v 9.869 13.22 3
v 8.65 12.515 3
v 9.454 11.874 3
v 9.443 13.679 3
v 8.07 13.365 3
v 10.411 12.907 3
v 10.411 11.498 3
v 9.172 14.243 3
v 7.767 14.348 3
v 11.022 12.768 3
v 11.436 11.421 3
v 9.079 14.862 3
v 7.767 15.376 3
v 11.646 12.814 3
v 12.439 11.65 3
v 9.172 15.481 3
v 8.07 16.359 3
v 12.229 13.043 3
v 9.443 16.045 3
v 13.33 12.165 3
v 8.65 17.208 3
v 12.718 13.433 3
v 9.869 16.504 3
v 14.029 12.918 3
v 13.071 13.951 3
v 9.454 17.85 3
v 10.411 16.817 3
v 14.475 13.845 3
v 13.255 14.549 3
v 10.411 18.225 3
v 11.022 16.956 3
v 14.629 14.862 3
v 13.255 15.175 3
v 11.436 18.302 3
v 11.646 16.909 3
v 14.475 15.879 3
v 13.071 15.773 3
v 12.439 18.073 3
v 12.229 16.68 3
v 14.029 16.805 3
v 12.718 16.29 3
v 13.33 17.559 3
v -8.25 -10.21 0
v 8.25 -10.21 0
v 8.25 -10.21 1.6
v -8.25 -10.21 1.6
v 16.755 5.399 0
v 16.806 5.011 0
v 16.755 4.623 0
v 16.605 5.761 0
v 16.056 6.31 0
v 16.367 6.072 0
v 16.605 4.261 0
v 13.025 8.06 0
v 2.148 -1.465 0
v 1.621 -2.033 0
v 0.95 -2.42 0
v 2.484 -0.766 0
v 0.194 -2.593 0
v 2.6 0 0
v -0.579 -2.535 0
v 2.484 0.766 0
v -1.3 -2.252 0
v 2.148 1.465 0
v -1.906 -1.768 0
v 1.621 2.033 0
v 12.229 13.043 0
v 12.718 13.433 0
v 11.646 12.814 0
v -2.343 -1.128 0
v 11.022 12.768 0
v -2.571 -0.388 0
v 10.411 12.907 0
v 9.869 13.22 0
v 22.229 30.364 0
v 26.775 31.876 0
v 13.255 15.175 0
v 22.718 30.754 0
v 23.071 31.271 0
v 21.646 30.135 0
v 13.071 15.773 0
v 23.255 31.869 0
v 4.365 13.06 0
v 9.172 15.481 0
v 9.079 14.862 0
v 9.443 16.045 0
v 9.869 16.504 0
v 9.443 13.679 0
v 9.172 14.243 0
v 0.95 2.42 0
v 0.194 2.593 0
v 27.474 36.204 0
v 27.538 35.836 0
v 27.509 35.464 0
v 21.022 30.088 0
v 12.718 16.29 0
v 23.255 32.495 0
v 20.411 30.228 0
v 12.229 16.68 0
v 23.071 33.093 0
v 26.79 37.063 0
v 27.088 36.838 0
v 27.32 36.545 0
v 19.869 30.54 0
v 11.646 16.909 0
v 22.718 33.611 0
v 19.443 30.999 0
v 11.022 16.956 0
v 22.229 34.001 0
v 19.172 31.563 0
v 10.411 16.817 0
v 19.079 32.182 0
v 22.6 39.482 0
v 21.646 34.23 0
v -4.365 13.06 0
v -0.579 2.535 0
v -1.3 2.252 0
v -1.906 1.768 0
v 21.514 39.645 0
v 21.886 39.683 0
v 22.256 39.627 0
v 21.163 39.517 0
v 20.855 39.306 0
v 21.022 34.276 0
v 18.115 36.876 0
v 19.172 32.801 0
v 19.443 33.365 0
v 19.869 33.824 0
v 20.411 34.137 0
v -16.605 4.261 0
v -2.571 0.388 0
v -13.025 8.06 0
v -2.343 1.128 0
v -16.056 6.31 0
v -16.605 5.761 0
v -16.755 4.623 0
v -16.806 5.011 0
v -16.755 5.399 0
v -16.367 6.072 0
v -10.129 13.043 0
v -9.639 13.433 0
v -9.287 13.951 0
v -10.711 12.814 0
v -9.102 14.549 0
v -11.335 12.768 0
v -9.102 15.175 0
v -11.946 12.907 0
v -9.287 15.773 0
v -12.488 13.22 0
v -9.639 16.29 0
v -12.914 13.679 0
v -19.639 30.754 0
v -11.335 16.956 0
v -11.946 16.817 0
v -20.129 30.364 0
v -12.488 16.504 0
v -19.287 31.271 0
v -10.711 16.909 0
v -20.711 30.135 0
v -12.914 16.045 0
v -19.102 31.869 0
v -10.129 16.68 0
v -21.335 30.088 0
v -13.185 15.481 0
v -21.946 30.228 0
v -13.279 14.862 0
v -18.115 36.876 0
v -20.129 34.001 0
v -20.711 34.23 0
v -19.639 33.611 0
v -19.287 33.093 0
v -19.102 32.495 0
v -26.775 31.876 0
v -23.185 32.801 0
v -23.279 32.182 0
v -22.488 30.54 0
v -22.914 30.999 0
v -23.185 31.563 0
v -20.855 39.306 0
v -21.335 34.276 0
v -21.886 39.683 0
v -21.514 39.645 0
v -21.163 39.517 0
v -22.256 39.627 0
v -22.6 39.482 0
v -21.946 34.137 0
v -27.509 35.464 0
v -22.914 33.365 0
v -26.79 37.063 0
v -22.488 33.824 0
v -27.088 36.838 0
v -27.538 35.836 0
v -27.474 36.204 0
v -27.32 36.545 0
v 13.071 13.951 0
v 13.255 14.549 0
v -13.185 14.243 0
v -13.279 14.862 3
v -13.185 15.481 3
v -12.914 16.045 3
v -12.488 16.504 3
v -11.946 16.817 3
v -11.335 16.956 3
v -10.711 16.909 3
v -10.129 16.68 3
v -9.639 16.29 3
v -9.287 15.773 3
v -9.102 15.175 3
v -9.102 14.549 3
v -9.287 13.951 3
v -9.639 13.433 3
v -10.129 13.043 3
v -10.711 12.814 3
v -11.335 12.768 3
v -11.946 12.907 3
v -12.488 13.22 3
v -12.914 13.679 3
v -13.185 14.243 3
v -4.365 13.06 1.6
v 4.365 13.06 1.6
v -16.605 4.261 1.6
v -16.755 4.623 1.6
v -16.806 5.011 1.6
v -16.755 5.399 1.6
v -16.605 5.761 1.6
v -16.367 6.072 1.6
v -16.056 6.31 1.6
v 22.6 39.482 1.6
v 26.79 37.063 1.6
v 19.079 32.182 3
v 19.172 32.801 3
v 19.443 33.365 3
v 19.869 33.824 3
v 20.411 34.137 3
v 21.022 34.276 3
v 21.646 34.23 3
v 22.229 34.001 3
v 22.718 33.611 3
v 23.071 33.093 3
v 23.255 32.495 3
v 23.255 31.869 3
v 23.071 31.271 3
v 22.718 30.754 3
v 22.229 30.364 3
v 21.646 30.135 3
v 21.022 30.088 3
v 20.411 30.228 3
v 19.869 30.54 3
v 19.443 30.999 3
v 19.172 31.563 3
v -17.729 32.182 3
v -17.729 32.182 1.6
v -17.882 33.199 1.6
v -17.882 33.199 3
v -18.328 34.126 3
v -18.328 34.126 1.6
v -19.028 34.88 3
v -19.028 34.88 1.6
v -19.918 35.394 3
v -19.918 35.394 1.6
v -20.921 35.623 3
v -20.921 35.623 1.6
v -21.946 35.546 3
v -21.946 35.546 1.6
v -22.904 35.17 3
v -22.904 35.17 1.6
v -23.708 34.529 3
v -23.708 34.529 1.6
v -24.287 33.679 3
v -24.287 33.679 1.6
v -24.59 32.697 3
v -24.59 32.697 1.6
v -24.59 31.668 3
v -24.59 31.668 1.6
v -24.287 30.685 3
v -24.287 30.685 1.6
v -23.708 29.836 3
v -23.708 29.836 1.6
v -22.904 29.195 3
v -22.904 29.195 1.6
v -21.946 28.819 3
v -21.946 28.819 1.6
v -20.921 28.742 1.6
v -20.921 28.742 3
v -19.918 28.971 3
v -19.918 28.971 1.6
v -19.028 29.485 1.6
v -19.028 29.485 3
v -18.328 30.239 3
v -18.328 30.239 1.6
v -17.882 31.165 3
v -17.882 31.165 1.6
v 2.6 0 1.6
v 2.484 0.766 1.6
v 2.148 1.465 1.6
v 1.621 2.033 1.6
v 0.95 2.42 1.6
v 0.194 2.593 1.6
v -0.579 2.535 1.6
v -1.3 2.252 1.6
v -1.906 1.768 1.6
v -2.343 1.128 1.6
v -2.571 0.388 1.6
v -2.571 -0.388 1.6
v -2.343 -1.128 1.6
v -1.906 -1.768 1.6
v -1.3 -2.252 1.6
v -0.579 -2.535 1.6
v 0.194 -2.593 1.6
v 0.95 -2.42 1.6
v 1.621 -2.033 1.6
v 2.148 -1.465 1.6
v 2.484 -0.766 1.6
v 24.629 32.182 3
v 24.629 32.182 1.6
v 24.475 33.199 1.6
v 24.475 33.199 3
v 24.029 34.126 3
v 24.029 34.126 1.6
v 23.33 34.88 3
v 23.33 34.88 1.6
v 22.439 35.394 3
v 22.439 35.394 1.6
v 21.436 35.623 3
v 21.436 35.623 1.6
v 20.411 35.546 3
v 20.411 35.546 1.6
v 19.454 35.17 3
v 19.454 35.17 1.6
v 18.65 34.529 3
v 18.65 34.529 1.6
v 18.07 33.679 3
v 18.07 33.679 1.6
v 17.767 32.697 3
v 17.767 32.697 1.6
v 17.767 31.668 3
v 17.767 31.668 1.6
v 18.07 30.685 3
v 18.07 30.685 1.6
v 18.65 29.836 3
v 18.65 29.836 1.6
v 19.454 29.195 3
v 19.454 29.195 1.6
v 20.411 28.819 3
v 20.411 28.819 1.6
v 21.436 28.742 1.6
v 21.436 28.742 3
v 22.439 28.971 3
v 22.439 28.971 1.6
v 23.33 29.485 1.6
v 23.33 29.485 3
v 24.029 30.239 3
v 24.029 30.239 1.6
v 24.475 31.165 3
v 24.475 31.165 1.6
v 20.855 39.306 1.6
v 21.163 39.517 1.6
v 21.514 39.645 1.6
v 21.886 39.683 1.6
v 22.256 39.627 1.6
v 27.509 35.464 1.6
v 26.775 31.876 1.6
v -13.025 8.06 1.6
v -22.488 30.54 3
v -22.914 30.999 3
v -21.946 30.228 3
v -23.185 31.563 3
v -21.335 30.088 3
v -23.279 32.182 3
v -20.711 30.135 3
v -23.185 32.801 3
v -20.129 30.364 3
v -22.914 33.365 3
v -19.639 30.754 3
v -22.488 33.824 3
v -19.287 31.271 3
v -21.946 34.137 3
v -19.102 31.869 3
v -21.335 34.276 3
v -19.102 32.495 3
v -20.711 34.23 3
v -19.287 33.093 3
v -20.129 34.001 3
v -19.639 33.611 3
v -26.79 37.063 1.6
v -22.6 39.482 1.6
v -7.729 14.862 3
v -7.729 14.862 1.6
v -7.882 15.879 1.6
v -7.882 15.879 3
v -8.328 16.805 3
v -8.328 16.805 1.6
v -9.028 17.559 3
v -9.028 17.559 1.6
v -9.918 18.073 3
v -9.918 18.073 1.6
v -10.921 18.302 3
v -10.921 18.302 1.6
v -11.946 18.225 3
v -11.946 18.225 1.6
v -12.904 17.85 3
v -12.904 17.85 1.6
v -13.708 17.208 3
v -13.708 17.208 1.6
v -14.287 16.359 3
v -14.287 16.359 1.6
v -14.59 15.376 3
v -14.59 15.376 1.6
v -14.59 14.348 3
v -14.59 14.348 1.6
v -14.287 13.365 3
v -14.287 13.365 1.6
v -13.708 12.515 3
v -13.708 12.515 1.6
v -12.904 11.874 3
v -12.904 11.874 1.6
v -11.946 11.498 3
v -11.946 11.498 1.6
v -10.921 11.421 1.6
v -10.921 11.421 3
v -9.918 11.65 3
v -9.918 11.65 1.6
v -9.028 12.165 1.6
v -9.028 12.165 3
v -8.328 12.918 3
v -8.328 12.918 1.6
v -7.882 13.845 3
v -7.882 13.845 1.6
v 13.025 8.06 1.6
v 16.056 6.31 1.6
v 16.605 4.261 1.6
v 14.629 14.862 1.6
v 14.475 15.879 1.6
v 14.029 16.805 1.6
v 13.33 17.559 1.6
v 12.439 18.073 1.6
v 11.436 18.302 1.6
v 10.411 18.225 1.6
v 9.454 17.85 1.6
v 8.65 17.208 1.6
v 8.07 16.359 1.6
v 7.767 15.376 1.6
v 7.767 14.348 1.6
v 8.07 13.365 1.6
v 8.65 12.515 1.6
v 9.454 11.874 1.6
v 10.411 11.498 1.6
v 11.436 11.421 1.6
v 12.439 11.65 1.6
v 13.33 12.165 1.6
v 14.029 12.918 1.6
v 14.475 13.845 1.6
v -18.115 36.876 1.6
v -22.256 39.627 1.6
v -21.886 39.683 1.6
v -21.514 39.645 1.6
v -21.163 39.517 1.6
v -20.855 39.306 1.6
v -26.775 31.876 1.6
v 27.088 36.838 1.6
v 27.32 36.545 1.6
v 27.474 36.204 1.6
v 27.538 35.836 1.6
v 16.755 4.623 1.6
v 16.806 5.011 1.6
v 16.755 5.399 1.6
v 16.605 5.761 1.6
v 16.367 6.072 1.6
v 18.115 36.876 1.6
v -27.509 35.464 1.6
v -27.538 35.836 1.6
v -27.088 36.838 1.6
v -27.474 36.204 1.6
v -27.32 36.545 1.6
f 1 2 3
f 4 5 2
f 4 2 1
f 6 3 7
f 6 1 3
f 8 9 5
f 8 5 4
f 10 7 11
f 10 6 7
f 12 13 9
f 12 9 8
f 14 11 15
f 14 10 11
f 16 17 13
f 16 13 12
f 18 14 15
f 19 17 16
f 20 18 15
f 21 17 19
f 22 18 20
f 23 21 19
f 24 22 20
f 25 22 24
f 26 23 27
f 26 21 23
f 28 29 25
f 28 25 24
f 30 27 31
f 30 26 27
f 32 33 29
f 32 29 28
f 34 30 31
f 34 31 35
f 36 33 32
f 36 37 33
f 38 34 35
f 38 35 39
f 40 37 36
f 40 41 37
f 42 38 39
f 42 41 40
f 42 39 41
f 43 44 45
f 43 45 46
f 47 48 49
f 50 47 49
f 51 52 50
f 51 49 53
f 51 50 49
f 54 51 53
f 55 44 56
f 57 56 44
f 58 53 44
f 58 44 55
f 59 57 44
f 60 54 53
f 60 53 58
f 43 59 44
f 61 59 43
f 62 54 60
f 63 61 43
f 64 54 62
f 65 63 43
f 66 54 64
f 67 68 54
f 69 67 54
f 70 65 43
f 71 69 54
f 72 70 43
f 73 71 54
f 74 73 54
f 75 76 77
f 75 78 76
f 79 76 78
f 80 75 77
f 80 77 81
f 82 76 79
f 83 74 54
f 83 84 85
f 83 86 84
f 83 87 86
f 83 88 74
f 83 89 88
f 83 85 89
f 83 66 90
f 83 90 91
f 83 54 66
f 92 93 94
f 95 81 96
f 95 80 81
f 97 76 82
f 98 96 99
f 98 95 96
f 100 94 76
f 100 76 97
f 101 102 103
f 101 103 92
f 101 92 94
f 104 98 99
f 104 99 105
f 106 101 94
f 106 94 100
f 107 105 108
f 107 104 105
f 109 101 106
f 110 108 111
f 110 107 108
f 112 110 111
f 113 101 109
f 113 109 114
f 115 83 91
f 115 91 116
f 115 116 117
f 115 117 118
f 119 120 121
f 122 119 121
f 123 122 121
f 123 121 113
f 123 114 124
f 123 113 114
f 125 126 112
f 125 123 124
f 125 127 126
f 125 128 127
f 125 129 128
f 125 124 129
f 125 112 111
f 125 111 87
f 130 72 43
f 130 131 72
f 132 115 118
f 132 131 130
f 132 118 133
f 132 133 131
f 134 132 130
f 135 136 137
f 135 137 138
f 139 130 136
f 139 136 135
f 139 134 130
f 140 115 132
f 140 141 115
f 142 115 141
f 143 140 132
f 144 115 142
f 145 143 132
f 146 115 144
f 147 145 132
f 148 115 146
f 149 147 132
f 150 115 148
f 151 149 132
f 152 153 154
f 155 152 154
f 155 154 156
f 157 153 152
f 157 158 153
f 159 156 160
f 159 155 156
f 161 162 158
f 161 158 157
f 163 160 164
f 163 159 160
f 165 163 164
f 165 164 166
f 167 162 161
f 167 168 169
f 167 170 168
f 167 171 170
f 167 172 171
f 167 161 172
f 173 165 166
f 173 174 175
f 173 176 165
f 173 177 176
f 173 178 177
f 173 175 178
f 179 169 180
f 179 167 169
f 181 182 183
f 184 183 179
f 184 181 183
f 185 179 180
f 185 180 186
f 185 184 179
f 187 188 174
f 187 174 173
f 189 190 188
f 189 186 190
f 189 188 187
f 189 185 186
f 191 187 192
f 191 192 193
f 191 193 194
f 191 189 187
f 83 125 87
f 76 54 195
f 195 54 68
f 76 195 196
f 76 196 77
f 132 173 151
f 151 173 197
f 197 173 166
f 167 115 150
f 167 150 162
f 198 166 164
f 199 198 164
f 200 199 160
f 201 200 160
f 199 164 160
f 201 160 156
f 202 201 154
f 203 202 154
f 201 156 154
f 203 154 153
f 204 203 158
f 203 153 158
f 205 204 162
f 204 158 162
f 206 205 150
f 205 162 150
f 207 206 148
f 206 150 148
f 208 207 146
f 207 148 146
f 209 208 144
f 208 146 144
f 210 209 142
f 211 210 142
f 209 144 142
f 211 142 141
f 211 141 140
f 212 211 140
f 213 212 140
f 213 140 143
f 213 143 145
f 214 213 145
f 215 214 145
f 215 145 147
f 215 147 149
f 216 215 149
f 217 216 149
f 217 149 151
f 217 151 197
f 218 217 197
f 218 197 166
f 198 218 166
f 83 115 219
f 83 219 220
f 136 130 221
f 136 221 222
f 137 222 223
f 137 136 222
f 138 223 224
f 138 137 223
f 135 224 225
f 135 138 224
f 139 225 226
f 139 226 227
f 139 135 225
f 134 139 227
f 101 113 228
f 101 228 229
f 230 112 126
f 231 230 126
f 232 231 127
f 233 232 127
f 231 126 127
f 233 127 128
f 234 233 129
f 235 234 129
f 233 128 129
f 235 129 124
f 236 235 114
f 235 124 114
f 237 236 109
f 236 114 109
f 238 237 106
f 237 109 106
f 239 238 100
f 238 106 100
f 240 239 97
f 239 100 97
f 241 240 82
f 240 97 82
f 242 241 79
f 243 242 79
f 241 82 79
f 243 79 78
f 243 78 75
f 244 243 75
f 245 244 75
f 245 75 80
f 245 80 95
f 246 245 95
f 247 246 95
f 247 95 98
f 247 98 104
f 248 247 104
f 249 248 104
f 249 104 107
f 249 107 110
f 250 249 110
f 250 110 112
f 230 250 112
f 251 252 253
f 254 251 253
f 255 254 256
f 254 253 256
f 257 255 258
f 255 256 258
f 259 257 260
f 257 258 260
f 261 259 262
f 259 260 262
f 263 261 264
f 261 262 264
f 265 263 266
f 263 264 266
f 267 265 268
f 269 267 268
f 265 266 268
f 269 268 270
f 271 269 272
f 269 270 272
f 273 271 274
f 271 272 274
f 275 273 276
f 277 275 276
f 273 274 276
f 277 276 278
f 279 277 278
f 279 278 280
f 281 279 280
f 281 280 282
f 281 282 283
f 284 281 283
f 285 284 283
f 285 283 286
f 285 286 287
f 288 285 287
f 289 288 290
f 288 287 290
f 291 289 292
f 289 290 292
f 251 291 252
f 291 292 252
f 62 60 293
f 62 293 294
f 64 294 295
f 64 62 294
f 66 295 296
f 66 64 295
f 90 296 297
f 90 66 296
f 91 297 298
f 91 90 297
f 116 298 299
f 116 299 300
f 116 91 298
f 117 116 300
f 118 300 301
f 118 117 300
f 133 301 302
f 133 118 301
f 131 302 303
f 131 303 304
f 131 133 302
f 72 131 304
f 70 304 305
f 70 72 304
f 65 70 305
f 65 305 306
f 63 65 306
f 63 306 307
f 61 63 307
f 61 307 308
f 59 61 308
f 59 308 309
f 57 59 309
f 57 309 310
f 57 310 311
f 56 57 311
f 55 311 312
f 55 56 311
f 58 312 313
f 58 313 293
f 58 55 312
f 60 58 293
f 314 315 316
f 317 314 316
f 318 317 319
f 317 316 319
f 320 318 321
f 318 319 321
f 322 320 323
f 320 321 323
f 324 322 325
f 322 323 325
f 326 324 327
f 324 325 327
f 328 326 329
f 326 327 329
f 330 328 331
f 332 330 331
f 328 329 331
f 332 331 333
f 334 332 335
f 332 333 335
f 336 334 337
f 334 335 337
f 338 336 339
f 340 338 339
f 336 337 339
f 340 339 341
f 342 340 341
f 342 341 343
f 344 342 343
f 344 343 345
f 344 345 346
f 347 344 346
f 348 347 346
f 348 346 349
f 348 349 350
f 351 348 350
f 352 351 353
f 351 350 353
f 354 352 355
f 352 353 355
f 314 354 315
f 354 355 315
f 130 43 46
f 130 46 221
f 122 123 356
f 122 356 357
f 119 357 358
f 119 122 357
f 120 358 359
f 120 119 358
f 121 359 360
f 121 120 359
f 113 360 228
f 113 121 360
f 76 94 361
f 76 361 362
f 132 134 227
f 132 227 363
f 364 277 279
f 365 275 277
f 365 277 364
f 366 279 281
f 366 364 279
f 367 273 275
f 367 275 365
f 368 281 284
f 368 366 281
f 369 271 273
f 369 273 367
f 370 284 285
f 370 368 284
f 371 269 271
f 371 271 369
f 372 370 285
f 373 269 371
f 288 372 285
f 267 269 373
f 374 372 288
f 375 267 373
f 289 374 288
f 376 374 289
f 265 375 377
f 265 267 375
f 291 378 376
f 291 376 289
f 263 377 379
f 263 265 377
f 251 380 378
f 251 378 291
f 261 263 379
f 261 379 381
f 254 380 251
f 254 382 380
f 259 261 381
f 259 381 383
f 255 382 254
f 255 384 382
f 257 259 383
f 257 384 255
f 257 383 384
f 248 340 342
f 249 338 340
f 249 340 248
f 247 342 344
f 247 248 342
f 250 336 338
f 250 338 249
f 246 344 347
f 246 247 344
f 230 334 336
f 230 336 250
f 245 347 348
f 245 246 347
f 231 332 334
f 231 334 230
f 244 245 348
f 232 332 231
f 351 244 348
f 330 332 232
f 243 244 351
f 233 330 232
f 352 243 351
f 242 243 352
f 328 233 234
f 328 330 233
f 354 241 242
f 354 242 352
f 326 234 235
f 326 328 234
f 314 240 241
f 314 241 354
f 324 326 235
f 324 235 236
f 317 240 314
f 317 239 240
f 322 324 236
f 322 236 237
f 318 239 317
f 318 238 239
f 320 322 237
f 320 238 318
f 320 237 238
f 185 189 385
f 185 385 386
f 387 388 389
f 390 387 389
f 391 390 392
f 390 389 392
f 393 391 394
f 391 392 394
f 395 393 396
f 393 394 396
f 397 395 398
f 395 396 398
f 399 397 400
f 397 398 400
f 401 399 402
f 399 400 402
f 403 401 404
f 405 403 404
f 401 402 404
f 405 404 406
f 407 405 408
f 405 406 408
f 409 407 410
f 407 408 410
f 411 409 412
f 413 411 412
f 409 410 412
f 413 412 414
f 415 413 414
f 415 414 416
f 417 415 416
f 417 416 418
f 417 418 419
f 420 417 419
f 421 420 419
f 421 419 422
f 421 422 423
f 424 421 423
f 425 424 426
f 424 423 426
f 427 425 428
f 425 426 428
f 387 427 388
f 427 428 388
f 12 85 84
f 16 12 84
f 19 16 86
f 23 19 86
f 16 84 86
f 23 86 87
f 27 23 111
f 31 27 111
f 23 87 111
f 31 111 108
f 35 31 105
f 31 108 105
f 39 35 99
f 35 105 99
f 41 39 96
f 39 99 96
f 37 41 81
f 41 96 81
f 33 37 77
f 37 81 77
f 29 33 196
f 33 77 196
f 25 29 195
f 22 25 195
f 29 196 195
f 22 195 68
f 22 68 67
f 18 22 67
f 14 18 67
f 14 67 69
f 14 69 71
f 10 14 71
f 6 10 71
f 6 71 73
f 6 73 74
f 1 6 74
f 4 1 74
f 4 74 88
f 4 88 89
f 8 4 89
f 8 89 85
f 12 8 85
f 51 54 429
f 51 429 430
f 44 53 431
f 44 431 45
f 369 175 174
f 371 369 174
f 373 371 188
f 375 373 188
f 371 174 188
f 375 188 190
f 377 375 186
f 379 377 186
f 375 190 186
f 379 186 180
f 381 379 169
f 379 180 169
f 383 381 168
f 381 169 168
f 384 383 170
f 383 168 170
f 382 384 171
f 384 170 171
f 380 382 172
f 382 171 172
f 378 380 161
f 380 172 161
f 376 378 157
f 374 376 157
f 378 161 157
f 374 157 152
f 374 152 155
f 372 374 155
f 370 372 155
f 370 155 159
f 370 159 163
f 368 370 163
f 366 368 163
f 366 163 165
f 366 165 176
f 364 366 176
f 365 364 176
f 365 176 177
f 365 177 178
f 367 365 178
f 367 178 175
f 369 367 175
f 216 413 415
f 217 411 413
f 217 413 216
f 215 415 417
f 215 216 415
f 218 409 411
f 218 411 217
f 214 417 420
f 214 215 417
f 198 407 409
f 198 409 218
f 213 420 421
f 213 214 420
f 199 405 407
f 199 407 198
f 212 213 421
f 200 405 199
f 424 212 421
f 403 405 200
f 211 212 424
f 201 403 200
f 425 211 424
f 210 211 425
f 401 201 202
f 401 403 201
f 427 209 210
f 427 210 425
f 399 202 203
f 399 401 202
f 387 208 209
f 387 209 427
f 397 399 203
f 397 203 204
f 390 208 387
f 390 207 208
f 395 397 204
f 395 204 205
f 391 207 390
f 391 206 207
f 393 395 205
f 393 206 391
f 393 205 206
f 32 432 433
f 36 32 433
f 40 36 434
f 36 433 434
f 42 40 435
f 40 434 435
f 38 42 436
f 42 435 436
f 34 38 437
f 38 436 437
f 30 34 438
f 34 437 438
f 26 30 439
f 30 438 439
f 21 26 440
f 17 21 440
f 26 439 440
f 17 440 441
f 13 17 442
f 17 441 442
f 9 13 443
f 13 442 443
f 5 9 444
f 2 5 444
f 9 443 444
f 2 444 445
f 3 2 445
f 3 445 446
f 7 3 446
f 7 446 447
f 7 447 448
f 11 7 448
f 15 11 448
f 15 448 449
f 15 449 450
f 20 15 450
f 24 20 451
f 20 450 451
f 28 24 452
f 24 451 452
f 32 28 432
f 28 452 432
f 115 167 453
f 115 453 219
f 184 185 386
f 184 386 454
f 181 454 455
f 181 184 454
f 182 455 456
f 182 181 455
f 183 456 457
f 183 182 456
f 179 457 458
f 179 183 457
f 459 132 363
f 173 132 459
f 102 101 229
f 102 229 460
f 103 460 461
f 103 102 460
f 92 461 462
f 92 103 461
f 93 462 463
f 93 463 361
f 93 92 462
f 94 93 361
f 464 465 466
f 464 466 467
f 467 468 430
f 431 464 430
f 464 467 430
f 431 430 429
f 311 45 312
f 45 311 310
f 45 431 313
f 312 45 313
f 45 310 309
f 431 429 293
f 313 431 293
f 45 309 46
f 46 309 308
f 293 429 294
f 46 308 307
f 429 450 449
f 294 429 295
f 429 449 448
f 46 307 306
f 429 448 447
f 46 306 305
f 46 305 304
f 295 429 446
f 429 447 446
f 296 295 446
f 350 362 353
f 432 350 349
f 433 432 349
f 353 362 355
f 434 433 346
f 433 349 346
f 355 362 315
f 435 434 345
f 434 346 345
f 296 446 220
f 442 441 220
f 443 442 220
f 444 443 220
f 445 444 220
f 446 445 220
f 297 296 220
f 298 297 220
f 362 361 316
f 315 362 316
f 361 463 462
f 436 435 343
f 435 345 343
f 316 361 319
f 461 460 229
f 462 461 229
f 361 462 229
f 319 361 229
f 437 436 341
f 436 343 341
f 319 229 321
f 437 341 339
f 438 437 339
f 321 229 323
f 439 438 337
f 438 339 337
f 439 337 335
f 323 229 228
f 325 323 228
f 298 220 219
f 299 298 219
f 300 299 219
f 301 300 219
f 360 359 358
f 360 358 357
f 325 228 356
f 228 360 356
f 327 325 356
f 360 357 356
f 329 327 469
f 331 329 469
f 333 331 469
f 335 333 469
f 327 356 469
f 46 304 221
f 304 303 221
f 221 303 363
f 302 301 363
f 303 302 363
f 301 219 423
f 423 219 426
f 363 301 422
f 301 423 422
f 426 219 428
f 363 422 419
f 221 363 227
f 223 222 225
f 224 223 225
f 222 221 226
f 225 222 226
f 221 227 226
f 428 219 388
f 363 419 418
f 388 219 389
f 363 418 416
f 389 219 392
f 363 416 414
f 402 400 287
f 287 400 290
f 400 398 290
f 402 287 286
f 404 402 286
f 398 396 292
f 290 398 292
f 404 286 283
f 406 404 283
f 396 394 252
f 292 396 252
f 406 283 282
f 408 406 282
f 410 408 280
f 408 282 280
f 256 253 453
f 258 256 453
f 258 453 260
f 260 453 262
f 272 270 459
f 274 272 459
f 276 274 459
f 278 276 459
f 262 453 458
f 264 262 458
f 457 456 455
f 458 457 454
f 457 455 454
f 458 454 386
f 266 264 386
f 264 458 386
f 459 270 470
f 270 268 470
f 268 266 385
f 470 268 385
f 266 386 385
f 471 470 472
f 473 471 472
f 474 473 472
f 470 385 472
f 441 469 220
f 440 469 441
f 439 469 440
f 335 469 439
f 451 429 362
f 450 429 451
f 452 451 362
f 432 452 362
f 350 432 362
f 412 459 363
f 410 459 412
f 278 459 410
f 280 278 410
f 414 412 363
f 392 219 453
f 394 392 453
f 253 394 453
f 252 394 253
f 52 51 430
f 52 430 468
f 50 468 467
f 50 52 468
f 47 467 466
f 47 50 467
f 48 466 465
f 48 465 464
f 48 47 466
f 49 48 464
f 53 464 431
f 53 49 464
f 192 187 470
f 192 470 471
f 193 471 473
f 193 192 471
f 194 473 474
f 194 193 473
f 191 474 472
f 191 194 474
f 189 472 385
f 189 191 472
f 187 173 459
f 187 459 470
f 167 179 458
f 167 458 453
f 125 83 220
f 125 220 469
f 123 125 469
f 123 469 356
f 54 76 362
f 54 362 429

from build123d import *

# Parameters (mm, degrees)
SKETCH1_R             = 2.6
BOSS_EXTRUDE1_DEPTH   = 1.6
SKETCH2_R             = 3.45
BOSS_EXTRUDE2_DEPTH   = 1.4
M5X0_8_TAPPED_HOLE1_D = 4.2


with BuildPart() as part:
    # Sketch1 → Boss-Extrude1 (new body)
    with BuildSketch(Plane.XY):
        with BuildLine():
            Line((-4.364768035, 13.06), (4.364768035, 13.06))
            Line((4.364768035, 13.06), (18.114768035, 36.875698604))
            Line((18.114768035, 36.875698604), (20.854894903, 39.305509792))
            ThreePointArc((20.854894903, 39.305509792), (21.698970531, 39.675572625), (22.600099833, 39.482243506))
            Line((22.600099833, 39.482243506), (26.789690275, 37.063382336))
            ThreePointArc((26.789690275, 37.063382336), (27.407682855, 36.379646028), (27.509236854, 35.463623675))
            Line((27.509236854, 35.463623675), (26.775022073, 31.875698604))
            Line((26.775022073, 31.875698604), (13.025022073, 8.06))
            Line((13.025022073, 8.06), (16.056110986, 6.31))
            ThreePointArc((16.056110986, 6.31), (16.754999726, 5.399190462), (16.605149092, 4.260961894))
            Line((16.605149092, 4.260961894), (8.250335347, -10.21))
            Line((8.250335347, -10.21), (-8.250335347, -10.21))
            Line((-8.250335347, -10.21), (-16.605149092, 4.260961894))
            ThreePointArc((-16.605149092, 4.260961894), (-16.754999726, 5.399190462), (-16.056110986, 6.31))
            Line((-16.056110986, 6.31), (-13.025022073, 8.06))
            Line((-13.025022073, 8.06), (-26.775022073, 31.875698604))
            Line((-26.775022073, 31.875698604), (-27.509236854, 35.463623675))
            ThreePointArc((-27.509236854, 35.463623675), (-27.407682855, 36.379646028), (-26.789690275, 37.063382336))
            Line((-26.789690275, 37.063382336), (-22.600099833, 39.482243506))
            ThreePointArc((-22.600099833, 39.482243506), (-21.698970531, 39.675572625), (-20.854894903, 39.305509792))
            Line((-20.854894903, 39.305509792), (-18.114768035, 36.875698604))
            Line((-18.114768035, 36.875698604), (-4.364768035, 13.06))
        make_face()
        Circle(SKETCH1_R, mode=Mode.SUBTRACT)
    extrude(amount=BOSS_EXTRUDE1_DEPTH)

    # Sketch2 → Boss-Extrude2 (add)
    with BuildSketch(Plane.XY.offset(1.6)):
        with Locations((21.178557159, 32.18233703)):
            Circle(SKETCH2_R)
        with Locations((11.178557159, 14.861828954)):
            Circle(SKETCH2_R)
        with Locations((-11.178557159, 14.861828954)):
            Circle(SKETCH2_R)
        with Locations((-21.178557159, 32.18233703)):
            Circle(SKETCH2_R)
    extrude(amount=BOSS_EXTRUDE2_DEPTH)

    # M5x0.8 Tapped Hole1 (through all)
    with Locations(Plane.XY.offset(3)):
        with Locations((21.178557159, 32.18233703), (11.178557159, 14.861828954), (-11.178557159, 14.861828954), (-21.178557159, 32.18233703)):
            Hole(M5X0_8_TAPPED_HOLE1_D / 2)


solid = part.part
